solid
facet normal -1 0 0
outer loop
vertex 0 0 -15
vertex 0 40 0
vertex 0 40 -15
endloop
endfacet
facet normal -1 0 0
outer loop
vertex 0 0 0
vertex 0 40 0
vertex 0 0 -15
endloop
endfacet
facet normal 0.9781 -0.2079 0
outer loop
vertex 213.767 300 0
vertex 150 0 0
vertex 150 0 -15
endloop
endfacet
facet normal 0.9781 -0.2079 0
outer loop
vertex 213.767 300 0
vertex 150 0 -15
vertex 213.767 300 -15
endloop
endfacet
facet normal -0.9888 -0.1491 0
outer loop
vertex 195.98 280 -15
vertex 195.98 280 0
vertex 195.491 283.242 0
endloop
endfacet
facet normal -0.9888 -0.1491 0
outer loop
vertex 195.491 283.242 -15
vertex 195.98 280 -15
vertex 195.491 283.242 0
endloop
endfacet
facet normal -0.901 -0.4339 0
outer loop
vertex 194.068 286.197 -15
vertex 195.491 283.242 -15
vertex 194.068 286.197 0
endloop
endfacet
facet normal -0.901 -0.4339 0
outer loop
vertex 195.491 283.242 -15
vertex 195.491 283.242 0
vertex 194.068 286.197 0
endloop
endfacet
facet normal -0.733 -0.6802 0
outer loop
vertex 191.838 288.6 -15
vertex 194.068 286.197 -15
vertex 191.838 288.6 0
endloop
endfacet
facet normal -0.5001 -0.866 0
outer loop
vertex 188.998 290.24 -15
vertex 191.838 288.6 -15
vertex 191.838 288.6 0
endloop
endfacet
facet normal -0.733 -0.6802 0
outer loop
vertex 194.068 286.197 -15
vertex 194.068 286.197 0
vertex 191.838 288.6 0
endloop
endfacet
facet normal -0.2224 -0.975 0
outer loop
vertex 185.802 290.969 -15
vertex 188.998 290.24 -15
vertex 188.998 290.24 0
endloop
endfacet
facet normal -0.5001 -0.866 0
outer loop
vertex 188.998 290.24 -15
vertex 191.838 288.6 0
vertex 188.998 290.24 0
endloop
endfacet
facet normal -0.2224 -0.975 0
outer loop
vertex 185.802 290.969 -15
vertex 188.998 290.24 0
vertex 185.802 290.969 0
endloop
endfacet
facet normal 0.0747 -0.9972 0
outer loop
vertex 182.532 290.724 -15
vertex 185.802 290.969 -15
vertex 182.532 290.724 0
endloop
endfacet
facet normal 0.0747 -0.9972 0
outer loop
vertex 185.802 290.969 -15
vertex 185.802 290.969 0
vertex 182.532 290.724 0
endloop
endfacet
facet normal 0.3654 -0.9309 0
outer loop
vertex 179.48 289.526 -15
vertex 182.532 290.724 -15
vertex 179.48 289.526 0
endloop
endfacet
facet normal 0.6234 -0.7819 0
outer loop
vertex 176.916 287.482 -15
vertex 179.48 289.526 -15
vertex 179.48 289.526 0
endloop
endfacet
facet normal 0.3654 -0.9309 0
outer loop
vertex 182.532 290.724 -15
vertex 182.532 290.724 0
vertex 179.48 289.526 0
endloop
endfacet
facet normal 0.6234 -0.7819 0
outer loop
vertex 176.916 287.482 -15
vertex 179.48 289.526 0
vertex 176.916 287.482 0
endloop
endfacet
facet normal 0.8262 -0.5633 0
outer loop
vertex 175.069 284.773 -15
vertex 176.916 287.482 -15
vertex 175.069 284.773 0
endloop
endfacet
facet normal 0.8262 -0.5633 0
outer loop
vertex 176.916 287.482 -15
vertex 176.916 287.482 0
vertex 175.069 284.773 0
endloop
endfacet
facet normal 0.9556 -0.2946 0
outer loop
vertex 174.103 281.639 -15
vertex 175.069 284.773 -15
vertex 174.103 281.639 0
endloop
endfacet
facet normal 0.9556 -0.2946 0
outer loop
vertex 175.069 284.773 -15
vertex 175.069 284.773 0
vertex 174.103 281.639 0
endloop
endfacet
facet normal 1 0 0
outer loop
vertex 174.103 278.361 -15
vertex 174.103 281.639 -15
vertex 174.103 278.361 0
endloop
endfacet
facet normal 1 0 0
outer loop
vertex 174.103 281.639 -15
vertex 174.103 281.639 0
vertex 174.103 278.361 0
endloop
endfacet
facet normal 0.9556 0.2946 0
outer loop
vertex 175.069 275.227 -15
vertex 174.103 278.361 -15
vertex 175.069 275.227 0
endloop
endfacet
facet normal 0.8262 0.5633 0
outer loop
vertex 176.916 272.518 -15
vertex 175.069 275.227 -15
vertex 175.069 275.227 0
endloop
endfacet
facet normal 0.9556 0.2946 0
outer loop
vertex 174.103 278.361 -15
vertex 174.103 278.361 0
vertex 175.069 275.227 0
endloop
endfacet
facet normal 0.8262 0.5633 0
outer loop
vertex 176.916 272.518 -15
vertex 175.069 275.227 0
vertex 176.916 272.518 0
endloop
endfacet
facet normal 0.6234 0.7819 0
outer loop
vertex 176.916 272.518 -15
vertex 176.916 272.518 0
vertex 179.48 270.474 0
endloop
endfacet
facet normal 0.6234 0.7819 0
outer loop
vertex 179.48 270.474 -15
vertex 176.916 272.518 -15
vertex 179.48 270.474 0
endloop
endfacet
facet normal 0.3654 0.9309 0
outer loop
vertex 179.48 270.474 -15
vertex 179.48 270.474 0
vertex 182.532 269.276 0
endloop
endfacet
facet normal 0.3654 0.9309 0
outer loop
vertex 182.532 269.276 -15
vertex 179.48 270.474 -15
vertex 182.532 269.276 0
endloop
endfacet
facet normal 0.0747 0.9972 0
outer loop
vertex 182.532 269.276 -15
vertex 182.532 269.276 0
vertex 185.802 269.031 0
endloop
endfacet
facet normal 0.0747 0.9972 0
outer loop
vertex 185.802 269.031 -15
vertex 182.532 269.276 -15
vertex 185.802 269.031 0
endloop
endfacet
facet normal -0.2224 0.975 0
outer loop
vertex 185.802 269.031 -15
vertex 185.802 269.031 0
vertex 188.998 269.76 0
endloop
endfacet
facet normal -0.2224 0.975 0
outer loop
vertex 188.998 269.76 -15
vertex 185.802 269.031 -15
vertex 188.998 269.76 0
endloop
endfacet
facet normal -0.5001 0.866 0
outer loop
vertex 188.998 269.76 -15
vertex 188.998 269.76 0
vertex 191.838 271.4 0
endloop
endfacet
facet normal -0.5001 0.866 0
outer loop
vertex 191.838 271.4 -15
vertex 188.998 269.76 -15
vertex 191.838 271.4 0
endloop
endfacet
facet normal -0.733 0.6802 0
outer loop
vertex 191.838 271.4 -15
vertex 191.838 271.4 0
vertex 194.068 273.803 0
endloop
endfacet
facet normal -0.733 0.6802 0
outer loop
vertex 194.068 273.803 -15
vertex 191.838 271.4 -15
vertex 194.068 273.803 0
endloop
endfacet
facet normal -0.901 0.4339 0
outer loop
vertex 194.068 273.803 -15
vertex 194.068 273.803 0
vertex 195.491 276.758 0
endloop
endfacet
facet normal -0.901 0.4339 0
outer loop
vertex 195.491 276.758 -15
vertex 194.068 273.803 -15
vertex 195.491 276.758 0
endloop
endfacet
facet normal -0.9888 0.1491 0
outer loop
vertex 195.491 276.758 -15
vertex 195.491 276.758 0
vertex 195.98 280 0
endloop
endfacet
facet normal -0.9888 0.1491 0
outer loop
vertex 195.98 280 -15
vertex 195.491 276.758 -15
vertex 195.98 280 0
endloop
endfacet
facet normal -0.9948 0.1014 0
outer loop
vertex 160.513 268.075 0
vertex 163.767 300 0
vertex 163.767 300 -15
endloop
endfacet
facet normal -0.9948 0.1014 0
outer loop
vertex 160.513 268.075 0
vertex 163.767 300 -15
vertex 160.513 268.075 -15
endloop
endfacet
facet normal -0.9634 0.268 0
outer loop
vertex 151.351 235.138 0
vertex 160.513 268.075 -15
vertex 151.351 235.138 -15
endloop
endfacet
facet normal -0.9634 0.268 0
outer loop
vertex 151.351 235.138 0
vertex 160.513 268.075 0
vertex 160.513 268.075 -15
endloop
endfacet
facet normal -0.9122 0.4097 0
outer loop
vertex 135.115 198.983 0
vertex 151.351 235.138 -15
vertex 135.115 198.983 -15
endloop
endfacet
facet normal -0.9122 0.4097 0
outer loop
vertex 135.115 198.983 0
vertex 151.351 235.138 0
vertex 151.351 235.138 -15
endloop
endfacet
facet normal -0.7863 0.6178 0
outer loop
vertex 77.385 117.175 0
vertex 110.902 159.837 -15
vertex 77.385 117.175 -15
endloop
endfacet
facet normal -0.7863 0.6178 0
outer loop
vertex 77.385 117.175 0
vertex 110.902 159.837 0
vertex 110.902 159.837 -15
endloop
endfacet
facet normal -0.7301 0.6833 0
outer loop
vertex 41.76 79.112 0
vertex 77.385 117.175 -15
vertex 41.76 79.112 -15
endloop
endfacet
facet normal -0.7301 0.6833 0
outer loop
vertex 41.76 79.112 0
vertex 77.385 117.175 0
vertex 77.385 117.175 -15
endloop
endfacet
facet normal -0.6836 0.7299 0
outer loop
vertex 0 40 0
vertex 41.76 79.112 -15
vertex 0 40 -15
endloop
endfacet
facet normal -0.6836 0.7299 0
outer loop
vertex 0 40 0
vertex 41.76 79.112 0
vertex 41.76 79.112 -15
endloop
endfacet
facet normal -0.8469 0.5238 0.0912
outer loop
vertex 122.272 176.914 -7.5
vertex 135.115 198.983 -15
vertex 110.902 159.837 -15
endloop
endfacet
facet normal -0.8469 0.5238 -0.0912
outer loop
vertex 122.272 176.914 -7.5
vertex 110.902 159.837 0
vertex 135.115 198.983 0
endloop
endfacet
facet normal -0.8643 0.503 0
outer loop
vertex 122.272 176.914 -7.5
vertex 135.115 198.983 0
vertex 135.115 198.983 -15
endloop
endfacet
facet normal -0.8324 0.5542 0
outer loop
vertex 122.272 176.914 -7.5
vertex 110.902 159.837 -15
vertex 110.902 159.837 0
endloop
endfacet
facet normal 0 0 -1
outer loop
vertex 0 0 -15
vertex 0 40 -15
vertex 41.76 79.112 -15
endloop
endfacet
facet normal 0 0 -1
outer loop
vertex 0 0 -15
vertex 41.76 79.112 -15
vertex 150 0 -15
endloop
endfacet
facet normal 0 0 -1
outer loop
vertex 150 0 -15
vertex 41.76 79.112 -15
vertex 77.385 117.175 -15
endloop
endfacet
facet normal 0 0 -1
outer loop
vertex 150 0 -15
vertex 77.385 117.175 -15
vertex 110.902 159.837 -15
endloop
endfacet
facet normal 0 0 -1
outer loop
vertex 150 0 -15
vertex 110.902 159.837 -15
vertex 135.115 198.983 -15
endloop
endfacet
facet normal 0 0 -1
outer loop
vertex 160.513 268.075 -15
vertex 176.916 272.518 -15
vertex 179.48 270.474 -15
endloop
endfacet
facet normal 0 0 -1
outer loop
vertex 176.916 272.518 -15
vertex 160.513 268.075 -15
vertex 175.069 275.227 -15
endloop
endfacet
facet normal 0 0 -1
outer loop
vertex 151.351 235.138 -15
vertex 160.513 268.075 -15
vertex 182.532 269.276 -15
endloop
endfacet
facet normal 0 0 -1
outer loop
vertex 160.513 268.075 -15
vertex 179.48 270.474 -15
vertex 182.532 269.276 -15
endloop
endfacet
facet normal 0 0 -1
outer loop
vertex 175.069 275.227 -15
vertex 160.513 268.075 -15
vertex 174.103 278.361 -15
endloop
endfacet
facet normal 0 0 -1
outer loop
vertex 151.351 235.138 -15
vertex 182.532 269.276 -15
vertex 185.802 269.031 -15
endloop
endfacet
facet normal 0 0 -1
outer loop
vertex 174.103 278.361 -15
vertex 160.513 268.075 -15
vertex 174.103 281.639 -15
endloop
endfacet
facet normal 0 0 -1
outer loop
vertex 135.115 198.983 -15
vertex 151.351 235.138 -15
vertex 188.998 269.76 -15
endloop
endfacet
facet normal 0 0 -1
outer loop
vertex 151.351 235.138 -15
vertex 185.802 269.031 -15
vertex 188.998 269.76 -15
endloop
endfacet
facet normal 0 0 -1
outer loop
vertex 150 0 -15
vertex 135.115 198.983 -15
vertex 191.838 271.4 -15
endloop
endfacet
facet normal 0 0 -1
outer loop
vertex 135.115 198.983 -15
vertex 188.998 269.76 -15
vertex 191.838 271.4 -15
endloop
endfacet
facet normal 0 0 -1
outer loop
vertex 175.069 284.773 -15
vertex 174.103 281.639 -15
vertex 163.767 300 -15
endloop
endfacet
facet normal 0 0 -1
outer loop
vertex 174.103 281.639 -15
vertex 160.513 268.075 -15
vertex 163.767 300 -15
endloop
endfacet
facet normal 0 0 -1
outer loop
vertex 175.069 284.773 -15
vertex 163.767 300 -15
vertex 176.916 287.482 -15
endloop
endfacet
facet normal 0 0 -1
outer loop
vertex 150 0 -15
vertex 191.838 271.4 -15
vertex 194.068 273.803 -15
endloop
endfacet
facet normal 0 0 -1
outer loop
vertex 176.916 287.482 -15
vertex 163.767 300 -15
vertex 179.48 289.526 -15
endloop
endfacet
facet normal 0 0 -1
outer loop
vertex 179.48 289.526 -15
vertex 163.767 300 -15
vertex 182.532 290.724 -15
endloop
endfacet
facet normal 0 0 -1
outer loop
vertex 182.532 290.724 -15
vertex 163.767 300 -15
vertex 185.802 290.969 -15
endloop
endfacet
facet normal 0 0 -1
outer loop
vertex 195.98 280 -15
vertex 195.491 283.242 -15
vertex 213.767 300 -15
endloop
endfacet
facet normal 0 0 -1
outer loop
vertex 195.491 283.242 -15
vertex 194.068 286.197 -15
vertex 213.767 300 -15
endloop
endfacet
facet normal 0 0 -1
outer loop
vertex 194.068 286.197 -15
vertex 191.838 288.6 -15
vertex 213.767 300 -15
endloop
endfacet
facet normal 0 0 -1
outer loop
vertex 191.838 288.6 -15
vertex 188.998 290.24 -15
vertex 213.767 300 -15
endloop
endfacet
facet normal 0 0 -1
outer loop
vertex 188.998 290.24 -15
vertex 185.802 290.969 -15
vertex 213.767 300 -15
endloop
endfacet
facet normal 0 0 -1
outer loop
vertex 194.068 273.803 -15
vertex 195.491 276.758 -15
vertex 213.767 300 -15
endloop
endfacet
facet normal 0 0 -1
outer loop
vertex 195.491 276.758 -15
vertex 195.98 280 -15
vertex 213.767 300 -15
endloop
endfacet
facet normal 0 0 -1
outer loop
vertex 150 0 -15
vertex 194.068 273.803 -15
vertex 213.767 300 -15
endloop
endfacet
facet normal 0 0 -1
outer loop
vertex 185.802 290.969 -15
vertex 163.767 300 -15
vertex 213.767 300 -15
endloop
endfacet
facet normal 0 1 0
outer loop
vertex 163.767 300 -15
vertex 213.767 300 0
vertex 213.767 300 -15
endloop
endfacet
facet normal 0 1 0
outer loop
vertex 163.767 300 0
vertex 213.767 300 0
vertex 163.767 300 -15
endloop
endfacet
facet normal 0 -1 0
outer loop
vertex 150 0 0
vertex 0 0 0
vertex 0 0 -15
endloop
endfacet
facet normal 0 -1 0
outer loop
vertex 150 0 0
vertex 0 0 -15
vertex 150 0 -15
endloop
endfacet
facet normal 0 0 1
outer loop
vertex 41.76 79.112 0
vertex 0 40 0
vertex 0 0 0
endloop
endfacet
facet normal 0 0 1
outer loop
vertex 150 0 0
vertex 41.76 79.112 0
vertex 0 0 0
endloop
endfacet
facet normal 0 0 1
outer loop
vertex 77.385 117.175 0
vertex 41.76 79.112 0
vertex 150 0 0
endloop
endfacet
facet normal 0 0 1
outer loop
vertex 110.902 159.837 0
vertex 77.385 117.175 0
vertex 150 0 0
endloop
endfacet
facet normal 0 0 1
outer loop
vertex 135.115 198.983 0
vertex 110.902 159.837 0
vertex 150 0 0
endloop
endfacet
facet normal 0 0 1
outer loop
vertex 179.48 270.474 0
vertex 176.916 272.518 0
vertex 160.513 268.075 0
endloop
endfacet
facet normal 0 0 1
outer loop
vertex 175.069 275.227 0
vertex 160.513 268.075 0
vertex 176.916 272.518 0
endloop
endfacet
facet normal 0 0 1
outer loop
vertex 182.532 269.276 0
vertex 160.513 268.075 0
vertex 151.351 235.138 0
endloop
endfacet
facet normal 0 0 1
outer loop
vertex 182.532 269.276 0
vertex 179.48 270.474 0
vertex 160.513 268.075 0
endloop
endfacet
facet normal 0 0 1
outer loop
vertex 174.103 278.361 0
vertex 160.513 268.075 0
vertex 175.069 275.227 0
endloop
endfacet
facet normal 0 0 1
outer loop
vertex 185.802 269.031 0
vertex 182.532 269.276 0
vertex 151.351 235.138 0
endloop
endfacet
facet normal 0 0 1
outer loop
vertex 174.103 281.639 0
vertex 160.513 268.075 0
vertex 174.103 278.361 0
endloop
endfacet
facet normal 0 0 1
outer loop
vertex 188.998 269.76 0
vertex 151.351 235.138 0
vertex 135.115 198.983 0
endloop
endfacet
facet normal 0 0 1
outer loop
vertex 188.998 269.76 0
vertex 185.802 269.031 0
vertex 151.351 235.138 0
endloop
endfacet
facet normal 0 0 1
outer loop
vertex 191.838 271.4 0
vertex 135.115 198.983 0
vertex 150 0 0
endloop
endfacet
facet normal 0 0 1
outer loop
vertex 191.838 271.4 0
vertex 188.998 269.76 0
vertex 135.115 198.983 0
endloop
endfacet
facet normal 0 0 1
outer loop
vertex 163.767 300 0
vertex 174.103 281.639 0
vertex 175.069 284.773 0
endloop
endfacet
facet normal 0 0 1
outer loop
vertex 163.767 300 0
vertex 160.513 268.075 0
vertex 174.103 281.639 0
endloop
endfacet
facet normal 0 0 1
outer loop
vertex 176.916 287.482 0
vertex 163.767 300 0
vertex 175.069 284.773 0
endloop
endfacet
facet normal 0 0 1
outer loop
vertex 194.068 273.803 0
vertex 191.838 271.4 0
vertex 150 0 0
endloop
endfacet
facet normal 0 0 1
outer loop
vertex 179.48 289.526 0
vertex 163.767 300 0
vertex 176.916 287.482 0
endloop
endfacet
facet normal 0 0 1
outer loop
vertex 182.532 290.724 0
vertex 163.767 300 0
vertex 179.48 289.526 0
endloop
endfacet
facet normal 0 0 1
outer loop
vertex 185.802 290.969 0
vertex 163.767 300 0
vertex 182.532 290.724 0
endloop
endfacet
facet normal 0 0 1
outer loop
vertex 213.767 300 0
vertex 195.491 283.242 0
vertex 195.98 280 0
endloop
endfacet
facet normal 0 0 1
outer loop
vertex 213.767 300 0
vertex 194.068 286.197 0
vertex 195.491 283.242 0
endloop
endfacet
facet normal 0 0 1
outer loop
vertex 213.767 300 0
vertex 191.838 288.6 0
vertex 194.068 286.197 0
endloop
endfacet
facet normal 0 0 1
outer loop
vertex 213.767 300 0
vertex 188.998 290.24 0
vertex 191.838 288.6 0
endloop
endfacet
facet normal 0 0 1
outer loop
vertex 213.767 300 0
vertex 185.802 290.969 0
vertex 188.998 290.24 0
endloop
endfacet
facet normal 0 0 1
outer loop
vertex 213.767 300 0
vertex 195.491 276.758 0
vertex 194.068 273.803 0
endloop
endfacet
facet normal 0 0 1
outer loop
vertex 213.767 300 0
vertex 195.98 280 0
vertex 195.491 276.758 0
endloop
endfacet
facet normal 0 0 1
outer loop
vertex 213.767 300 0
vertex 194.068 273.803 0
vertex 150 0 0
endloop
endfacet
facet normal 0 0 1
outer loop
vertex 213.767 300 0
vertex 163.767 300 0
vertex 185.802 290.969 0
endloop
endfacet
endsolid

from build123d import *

# Parameters (mm, degrees)
BOSS_EXTRUDE1_DEPTH = 15
SKETCH3_R           = 11
CUT_EXTRUDE1_DEPTH  = 369.675083139


with BuildPart() as part:
    # Sketch2 → Boss-Extrude1 (new body)
    with BuildSketch(Plane.XY):
        with BuildLine():
            Line((0, 0), (150, 0))
            Line((150, 0), (213.766968501, 300))
            Line((213.766968501, 300), (163.766968501, 300))
            add(Edge.make_bspline(
                [(163.766968501, 300), (162.660354377, 183.828545376), (0, 40)],
                knots=[0, 0, 0, 0.298724745, 0.298724745, 0.298724745], degree=2))
            Line((0, 40), (0, 0))
        make_face()
    extrude(amount=-BOSS_EXTRUDE1_DEPTH)

    # Sketch3 → Cut-Extrude1 (cut, through all)
    with BuildSketch(Plane.XY):
        with Locations((184.979662991, 280)):
            Circle(SKETCH3_R)
    extrude(amount=-CUT_EXTRUDE1_DEPTH, mode=Mode.SUBTRACT)


solid = part.part
